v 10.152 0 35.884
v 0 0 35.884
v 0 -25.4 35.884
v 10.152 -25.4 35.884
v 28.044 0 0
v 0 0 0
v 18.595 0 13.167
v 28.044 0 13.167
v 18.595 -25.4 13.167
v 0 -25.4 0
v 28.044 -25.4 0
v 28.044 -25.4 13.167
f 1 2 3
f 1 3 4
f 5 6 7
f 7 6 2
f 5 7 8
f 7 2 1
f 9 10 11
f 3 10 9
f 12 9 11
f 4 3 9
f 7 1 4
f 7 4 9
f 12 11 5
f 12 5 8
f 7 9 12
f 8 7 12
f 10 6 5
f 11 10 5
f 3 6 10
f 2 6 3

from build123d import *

# Parameters (mm, degrees)
F0_W     = 37.4921225011
F0_H     = 35.8838811517
F1_DEPTH = 25.4
F3_DEPTH = 25.4
F4_W     = 9.4484174624
F4_H     = 13.1674753502
F5_DEPTH = 25.4


with BuildPart() as f1:
    # F0 (on Front) → F1 (new body)
    with BuildSketch(Plane.XZ):
        with Locations((18.7460612506, 17.9419405758)):
            Rectangle(F0_W, F0_H)
    extrude(amount=F1_DEPTH)

    # F2 (on face) → F3 (cut)
    with BuildSketch(Plane.XZ.offset(25.4)):
        Polygon((37.4921225011, 35.8838811517), (10.1520223543, 35.8838811517), (18.5952875763, 13.1674753502), (37.4921225011, 13.1674753502), align=None)
    extrude(amount=-F3_DEPTH, mode=Mode.SUBTRACT)

    # F4 (on face) → F5 (cut)
    with BuildSketch(Plane.XZ.offset(25.4)):
        with Locations((32.7679137699, 6.5837376751)):
            Rectangle(F4_W, F4_H)
    extrude(amount=-F5_DEPTH, mode=Mode.SUBTRACT)


solid = f1.part
